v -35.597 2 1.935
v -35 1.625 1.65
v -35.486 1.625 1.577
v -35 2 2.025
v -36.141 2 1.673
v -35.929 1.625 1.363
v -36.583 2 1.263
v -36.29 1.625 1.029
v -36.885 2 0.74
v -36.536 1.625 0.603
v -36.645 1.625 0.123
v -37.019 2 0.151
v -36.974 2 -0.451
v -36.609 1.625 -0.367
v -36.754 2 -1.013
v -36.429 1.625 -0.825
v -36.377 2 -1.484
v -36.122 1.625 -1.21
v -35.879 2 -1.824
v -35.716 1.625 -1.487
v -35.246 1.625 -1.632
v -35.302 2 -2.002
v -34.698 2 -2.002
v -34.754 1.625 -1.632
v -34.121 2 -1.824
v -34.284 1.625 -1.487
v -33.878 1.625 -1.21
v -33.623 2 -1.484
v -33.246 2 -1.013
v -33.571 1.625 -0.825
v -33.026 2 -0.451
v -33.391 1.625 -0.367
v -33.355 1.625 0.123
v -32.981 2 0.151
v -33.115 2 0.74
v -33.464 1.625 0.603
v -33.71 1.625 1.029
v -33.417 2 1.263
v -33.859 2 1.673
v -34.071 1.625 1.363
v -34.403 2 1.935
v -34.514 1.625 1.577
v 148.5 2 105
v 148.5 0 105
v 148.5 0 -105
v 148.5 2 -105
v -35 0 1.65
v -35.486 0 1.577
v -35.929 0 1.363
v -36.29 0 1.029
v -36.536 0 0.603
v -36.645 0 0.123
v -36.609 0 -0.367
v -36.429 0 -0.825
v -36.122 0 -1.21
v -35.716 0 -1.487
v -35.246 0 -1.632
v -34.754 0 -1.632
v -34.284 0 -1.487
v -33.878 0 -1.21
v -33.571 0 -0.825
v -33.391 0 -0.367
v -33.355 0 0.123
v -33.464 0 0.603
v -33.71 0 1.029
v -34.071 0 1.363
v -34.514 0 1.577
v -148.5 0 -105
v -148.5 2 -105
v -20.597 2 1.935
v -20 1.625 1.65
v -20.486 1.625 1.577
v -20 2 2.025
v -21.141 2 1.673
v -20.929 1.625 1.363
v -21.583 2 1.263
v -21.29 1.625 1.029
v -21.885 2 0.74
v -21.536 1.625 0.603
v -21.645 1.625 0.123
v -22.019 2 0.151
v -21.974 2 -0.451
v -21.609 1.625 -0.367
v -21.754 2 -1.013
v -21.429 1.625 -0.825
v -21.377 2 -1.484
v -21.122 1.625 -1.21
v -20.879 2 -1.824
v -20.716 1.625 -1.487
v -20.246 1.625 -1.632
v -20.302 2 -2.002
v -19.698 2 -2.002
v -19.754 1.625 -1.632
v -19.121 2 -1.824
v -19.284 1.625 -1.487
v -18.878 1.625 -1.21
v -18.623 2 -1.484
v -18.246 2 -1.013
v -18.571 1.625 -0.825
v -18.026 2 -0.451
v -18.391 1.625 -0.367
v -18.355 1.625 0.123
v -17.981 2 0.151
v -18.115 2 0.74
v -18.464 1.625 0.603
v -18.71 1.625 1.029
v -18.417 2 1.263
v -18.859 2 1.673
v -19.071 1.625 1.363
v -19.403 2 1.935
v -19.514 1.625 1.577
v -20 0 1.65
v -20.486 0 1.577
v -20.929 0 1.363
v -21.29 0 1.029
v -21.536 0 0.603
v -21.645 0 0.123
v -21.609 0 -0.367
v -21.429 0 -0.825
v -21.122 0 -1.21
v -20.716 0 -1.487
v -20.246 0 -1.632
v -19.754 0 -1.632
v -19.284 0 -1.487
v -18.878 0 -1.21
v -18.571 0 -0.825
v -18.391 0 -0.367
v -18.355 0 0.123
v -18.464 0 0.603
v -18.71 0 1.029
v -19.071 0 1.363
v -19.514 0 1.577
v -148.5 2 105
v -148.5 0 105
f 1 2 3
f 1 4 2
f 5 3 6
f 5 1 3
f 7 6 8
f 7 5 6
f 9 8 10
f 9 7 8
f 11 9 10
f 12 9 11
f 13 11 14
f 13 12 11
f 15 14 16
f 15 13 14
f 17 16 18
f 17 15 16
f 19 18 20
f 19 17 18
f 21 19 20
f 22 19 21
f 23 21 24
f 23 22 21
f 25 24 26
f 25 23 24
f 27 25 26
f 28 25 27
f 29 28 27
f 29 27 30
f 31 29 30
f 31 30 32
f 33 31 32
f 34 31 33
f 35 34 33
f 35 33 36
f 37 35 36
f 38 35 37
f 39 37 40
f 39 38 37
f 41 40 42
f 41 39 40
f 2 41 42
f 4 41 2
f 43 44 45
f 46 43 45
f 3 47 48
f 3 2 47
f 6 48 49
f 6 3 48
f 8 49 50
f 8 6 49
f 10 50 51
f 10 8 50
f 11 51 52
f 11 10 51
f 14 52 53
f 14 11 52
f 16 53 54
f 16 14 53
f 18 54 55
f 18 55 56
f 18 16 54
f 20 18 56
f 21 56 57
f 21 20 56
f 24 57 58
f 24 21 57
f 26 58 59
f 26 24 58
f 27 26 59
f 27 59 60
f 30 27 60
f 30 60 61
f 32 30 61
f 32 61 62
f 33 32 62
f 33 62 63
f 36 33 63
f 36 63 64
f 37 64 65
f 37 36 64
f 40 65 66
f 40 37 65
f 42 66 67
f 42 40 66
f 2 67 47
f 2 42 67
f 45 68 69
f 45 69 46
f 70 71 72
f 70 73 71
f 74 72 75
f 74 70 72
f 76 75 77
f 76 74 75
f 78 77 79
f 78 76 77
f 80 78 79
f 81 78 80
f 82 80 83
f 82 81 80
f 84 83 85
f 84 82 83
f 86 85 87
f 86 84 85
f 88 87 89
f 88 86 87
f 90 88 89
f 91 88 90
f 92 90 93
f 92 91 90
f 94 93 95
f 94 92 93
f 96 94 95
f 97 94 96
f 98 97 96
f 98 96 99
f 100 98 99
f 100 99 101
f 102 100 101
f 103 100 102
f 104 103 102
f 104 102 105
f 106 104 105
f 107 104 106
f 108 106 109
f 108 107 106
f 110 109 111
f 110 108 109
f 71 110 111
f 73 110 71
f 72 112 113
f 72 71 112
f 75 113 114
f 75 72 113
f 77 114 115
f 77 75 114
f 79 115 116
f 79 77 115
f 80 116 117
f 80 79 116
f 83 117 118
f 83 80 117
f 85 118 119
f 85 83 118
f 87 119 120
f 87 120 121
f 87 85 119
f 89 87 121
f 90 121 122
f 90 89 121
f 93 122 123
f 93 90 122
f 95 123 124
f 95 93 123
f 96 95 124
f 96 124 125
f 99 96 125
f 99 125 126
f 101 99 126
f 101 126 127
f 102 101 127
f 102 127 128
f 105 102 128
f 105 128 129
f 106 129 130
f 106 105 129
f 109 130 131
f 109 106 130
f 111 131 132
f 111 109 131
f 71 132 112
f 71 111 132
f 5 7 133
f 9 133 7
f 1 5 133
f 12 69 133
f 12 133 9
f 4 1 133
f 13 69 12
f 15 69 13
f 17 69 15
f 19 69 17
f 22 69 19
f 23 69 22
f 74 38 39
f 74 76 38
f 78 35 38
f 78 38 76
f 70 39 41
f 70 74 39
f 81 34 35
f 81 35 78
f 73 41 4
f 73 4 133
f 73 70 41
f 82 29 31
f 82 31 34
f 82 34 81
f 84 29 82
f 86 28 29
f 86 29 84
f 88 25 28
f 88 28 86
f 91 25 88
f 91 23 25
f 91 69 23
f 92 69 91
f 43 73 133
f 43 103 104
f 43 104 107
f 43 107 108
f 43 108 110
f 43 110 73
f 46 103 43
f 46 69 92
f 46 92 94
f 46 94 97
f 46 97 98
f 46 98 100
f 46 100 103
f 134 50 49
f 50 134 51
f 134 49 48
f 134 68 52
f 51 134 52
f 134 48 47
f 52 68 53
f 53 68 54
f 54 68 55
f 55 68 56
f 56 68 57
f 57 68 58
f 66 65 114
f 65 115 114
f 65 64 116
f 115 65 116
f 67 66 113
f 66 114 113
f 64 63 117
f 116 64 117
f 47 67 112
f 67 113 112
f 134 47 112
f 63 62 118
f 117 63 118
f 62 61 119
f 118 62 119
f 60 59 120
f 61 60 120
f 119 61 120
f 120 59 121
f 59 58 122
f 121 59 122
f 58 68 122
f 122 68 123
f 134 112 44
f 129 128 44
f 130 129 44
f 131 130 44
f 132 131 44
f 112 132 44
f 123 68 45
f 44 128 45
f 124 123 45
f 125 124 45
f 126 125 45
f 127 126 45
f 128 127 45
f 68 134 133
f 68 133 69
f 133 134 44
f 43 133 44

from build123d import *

# Parameters (mm, degrees)
SKETCH1_W                  = 297
SKETCH1_H                  = 210
BOSS_EXTRUDE1_DEPTH        = 2
M4_TAPPED_HOLE1_AT_2_COUNT = 2
M4_TAPPED_HOLE1_AT_2_PITCH = 15


with BuildPart() as part:
    # Sketch1 → Boss-Extrude1 (new body)
    with BuildSketch(Plane(origin=(0, 0, 0), x_dir=(1, 0, 0), z_dir=(0, 1, 0))):
        Rectangle(SKETCH1_W, SKETCH1_H)
    extrude(amount=BOSS_EXTRUDE1_DEPTH)

    # Sketch6 → M4 Tapped Hole1 (revolve, cut)
    with BuildSketch(Plane(origin=(-20, 2, 0), x_dir=(0, 0, 1), z_dir=(1, 0, 0))):
        Polygon((0, 0), (0, 2), (1.65, 2), (1.65, 0.375), (2.025, 0), align=None)
    m4_tapped_hole1 = revolve(axis=Axis((-20, 8.35, 0), (0, -1, 0)), mode=Mode.SUBTRACT)

    # M4 Tapped Hole1 at 2: M4 Tapped Hole1 ×2
    with Locations(*[(-i * M4_TAPPED_HOLE1_AT_2_PITCH, 0, 0) for i in range(1, M4_TAPPED_HOLE1_AT_2_COUNT)]):
        add(m4_tapped_hole1, mode=Mode.SUBTRACT)


solid = part.part
